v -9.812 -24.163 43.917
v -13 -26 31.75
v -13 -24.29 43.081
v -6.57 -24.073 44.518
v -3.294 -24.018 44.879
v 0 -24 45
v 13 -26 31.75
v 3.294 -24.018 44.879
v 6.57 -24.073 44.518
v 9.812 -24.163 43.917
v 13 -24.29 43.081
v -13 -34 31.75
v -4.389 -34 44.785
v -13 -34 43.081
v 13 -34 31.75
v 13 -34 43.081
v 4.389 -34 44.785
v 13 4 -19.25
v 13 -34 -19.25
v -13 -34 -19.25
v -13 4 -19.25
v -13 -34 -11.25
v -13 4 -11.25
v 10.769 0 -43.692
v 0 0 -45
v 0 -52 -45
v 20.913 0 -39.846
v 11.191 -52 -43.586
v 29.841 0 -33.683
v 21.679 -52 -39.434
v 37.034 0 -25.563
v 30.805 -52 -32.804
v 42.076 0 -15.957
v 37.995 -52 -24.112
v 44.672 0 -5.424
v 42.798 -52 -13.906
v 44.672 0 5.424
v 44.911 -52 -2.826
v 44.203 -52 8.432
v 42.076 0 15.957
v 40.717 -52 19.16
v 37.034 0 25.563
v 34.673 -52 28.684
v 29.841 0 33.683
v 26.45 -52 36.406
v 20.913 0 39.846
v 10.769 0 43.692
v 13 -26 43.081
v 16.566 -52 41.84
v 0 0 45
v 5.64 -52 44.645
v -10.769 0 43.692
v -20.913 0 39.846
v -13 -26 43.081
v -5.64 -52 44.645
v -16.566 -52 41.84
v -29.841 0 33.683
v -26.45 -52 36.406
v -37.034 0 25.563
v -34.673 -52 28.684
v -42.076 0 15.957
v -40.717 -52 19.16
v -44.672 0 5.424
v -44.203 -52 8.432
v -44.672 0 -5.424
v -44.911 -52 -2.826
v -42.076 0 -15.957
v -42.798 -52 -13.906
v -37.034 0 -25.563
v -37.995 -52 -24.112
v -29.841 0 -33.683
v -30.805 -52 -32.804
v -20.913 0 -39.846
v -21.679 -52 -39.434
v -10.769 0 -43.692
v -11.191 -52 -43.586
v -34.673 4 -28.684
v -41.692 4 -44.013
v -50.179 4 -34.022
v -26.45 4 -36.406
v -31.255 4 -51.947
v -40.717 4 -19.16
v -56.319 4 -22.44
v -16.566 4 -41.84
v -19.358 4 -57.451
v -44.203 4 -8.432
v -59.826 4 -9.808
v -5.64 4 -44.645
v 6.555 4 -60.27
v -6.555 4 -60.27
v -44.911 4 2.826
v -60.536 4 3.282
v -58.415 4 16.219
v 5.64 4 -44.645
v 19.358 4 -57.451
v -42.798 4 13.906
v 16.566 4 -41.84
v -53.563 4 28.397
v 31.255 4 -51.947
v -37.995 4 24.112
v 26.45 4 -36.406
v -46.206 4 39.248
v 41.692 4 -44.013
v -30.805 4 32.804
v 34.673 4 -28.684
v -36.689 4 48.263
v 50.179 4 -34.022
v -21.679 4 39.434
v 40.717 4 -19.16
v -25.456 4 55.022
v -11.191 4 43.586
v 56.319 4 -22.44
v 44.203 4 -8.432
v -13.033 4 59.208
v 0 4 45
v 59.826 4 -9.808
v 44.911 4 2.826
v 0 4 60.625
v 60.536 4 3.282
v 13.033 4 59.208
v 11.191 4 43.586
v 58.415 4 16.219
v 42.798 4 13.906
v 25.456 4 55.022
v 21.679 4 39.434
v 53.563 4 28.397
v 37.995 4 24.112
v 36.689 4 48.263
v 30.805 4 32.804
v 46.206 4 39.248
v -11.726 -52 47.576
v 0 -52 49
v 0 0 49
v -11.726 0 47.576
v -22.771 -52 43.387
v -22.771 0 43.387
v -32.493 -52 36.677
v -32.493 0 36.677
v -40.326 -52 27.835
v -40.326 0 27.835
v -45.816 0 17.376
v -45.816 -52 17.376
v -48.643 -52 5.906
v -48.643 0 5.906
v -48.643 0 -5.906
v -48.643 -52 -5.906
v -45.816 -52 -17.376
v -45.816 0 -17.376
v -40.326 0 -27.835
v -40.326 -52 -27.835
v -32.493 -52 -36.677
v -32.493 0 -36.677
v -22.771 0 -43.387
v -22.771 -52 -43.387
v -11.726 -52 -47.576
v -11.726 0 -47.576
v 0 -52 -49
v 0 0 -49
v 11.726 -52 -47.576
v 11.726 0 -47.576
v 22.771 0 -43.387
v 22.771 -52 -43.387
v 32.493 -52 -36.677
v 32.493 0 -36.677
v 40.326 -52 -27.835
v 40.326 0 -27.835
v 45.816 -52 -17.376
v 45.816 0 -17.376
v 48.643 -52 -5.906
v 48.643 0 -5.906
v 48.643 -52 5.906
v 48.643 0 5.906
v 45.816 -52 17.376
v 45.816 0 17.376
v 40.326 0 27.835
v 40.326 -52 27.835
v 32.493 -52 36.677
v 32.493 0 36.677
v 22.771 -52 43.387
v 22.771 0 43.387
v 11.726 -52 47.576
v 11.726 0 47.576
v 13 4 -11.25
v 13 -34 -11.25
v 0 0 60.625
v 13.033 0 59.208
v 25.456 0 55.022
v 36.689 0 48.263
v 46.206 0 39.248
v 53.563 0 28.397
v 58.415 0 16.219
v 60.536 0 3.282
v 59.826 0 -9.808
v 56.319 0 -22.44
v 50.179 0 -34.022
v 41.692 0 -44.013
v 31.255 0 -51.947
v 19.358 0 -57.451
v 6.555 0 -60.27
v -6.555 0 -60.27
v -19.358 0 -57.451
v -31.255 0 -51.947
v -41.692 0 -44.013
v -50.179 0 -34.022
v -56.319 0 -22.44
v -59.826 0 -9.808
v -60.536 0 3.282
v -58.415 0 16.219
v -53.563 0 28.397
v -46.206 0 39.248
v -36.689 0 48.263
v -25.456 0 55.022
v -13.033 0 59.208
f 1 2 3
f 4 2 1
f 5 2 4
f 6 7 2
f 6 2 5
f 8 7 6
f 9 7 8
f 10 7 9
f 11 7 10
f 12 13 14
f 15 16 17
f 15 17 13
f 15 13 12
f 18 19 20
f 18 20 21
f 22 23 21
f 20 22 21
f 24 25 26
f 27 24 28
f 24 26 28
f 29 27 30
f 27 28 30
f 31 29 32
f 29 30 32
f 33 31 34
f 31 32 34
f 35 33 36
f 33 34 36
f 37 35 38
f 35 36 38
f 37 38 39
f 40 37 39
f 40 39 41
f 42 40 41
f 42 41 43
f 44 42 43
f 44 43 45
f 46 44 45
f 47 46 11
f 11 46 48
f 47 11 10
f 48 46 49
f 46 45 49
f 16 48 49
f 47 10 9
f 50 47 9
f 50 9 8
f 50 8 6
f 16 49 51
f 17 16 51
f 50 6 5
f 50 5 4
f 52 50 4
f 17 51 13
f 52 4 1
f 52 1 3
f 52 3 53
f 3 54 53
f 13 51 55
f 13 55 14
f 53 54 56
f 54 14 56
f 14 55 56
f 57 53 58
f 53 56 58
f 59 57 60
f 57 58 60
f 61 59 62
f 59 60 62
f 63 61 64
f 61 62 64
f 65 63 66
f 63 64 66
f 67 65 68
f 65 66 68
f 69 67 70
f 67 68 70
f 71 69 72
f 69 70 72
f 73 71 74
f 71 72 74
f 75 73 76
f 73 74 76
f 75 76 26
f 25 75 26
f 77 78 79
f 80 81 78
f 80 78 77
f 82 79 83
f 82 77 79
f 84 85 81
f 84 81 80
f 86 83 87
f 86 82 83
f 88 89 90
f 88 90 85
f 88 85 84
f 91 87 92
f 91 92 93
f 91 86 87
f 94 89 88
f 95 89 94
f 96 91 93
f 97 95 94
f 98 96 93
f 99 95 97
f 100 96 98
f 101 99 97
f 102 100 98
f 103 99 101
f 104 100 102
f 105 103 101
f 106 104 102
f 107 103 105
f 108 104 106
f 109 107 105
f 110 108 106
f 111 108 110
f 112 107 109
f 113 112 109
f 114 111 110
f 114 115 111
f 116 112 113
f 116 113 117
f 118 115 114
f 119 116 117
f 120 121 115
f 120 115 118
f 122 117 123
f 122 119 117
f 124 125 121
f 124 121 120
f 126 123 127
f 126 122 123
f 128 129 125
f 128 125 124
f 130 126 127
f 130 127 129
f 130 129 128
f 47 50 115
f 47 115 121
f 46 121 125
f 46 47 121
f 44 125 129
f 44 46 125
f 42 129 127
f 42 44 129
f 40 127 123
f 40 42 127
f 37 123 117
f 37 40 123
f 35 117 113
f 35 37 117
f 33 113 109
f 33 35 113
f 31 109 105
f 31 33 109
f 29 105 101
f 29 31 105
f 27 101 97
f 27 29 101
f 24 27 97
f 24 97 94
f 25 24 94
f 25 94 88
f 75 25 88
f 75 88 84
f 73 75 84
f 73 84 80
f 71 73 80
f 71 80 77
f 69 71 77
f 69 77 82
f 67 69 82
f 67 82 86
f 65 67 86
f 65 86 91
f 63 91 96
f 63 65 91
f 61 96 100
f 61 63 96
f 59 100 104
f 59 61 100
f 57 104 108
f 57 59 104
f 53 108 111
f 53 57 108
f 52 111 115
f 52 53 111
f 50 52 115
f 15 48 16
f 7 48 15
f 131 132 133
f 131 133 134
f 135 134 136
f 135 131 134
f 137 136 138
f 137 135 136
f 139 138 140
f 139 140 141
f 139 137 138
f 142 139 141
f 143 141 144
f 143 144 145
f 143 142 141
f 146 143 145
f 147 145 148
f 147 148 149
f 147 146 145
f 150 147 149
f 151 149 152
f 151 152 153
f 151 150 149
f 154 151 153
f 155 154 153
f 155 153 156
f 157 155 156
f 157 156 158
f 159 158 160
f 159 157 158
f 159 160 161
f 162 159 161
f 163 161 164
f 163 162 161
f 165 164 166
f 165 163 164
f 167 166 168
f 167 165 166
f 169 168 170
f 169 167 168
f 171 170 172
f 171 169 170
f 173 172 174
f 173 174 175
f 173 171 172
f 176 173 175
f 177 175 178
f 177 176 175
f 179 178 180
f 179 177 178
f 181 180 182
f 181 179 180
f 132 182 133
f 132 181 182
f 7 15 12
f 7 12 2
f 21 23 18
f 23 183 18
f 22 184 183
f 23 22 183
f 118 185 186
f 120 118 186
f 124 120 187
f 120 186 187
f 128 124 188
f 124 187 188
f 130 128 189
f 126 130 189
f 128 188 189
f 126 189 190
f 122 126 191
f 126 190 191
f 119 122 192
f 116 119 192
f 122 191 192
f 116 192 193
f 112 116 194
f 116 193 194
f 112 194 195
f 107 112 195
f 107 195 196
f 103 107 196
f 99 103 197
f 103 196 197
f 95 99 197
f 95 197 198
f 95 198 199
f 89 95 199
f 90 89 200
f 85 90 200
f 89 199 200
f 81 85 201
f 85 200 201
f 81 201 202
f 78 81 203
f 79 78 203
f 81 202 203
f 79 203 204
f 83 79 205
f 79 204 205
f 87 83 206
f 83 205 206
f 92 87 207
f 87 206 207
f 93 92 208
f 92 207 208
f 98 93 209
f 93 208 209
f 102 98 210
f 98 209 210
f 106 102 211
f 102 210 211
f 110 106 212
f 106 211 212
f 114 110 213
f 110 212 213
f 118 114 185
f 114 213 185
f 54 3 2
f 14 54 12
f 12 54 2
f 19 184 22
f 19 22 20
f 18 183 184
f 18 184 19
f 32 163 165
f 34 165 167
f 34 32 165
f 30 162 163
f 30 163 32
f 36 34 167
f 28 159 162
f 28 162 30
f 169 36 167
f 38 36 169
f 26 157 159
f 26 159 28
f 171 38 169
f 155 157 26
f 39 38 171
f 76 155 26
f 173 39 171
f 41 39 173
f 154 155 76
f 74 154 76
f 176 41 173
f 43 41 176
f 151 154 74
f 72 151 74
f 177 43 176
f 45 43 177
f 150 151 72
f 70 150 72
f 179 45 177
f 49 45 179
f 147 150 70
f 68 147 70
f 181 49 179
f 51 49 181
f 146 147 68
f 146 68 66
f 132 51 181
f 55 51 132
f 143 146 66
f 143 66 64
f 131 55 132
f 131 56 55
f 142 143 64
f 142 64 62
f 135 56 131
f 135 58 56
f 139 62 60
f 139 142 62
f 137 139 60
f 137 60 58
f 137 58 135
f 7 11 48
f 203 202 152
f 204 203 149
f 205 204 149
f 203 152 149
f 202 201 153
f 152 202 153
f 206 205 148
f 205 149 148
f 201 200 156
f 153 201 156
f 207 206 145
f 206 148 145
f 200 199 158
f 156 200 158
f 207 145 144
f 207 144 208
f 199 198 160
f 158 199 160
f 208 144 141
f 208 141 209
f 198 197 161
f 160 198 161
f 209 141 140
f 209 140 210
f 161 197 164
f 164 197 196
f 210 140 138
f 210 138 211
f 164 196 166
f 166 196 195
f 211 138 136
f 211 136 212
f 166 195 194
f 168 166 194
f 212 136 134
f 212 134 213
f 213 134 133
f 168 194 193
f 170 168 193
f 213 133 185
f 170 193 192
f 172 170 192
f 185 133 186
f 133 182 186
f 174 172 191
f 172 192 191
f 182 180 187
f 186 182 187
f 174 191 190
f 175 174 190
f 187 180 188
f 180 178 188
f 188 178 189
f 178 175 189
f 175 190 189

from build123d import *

# Parameters (mm, degrees)
SKETCH_1_R      = 60.625
SKETCH_1_R_2    = 45
EXTRUDE_1_DEPTH = 4
EXTRUDE_START   = 52
SKETCH_8_R      = 49
SKETCH_8_R_2    = 45
EXTRUDE_3_DEPTH = 52
SKETCH_9_W      = 15
SKETCH_9_H      = 8
EXTRUDE_4_DEPTH = 13
SKETCH_9_3_W    = 8
SKETCH_9_3_H    = 38
EXTRUDE_5_DEPTH = 13
EXTRUDE_6_DEPTH = 13


with BuildPart() as part:
    # 草图1 → 凸台-拉伸1 (new body)
    with BuildSketch(Plane(origin=(0, 0, 0), x_dir=(1, 0, 0), z_dir=(0, 1, 0))):
        Circle(SKETCH_1_R)
        Circle(SKETCH_1_R_2, mode=Mode.SUBTRACT)
    extrude(amount=EXTRUDE_1_DEPTH)

    # 草图8 → 凸台-拉伸3 (add)
    with BuildSketch(Plane.XZ.offset(EXTRUDE_START)):
        Circle(SKETCH_8_R)
        Circle(SKETCH_8_R_2, mode=Mode.SUBTRACT)
    extrude(amount=-EXTRUDE_3_DEPTH)

    # 草图9 → 凸台-拉伸4 (add, symmetric)
    with BuildSketch(Plane(origin=(0, 0, 0), x_dir=(0, 0, -1), z_dir=(1, 0, 0))):
        with Locations((-39.25, -30)):
            Rectangle(SKETCH_9_W, SKETCH_9_H)
    extrude(amount=EXTRUDE_4_DEPTH, both=True)

    # 草图9<8> → 凸台-拉伸6 (add, symmetric)
    with BuildSketch(Plane(origin=(0, 0, 0), x_dir=(0, 0, -1), z_dir=(1, 0, 0))):
        Polygon((-31.75, -26), (-45, -24), (-45, -26), align=None)
    extrude(amount=EXTRUDE_6_DEPTH, both=True)


with BuildPart() as body_2:
    # 草图9<3> → 凸台-拉伸5 (new, symmetric)
    with BuildSketch(Plane(origin=(0, 0, 0), x_dir=(0, 0, -1), z_dir=(1, 0, 0))):
        with Locations((15.25, -15)):
            Rectangle(SKETCH_9_3_W, SKETCH_9_3_H)
    extrude(amount=EXTRUDE_5_DEPTH, both=True)


solid = Compound([part.part, body_2.part])
